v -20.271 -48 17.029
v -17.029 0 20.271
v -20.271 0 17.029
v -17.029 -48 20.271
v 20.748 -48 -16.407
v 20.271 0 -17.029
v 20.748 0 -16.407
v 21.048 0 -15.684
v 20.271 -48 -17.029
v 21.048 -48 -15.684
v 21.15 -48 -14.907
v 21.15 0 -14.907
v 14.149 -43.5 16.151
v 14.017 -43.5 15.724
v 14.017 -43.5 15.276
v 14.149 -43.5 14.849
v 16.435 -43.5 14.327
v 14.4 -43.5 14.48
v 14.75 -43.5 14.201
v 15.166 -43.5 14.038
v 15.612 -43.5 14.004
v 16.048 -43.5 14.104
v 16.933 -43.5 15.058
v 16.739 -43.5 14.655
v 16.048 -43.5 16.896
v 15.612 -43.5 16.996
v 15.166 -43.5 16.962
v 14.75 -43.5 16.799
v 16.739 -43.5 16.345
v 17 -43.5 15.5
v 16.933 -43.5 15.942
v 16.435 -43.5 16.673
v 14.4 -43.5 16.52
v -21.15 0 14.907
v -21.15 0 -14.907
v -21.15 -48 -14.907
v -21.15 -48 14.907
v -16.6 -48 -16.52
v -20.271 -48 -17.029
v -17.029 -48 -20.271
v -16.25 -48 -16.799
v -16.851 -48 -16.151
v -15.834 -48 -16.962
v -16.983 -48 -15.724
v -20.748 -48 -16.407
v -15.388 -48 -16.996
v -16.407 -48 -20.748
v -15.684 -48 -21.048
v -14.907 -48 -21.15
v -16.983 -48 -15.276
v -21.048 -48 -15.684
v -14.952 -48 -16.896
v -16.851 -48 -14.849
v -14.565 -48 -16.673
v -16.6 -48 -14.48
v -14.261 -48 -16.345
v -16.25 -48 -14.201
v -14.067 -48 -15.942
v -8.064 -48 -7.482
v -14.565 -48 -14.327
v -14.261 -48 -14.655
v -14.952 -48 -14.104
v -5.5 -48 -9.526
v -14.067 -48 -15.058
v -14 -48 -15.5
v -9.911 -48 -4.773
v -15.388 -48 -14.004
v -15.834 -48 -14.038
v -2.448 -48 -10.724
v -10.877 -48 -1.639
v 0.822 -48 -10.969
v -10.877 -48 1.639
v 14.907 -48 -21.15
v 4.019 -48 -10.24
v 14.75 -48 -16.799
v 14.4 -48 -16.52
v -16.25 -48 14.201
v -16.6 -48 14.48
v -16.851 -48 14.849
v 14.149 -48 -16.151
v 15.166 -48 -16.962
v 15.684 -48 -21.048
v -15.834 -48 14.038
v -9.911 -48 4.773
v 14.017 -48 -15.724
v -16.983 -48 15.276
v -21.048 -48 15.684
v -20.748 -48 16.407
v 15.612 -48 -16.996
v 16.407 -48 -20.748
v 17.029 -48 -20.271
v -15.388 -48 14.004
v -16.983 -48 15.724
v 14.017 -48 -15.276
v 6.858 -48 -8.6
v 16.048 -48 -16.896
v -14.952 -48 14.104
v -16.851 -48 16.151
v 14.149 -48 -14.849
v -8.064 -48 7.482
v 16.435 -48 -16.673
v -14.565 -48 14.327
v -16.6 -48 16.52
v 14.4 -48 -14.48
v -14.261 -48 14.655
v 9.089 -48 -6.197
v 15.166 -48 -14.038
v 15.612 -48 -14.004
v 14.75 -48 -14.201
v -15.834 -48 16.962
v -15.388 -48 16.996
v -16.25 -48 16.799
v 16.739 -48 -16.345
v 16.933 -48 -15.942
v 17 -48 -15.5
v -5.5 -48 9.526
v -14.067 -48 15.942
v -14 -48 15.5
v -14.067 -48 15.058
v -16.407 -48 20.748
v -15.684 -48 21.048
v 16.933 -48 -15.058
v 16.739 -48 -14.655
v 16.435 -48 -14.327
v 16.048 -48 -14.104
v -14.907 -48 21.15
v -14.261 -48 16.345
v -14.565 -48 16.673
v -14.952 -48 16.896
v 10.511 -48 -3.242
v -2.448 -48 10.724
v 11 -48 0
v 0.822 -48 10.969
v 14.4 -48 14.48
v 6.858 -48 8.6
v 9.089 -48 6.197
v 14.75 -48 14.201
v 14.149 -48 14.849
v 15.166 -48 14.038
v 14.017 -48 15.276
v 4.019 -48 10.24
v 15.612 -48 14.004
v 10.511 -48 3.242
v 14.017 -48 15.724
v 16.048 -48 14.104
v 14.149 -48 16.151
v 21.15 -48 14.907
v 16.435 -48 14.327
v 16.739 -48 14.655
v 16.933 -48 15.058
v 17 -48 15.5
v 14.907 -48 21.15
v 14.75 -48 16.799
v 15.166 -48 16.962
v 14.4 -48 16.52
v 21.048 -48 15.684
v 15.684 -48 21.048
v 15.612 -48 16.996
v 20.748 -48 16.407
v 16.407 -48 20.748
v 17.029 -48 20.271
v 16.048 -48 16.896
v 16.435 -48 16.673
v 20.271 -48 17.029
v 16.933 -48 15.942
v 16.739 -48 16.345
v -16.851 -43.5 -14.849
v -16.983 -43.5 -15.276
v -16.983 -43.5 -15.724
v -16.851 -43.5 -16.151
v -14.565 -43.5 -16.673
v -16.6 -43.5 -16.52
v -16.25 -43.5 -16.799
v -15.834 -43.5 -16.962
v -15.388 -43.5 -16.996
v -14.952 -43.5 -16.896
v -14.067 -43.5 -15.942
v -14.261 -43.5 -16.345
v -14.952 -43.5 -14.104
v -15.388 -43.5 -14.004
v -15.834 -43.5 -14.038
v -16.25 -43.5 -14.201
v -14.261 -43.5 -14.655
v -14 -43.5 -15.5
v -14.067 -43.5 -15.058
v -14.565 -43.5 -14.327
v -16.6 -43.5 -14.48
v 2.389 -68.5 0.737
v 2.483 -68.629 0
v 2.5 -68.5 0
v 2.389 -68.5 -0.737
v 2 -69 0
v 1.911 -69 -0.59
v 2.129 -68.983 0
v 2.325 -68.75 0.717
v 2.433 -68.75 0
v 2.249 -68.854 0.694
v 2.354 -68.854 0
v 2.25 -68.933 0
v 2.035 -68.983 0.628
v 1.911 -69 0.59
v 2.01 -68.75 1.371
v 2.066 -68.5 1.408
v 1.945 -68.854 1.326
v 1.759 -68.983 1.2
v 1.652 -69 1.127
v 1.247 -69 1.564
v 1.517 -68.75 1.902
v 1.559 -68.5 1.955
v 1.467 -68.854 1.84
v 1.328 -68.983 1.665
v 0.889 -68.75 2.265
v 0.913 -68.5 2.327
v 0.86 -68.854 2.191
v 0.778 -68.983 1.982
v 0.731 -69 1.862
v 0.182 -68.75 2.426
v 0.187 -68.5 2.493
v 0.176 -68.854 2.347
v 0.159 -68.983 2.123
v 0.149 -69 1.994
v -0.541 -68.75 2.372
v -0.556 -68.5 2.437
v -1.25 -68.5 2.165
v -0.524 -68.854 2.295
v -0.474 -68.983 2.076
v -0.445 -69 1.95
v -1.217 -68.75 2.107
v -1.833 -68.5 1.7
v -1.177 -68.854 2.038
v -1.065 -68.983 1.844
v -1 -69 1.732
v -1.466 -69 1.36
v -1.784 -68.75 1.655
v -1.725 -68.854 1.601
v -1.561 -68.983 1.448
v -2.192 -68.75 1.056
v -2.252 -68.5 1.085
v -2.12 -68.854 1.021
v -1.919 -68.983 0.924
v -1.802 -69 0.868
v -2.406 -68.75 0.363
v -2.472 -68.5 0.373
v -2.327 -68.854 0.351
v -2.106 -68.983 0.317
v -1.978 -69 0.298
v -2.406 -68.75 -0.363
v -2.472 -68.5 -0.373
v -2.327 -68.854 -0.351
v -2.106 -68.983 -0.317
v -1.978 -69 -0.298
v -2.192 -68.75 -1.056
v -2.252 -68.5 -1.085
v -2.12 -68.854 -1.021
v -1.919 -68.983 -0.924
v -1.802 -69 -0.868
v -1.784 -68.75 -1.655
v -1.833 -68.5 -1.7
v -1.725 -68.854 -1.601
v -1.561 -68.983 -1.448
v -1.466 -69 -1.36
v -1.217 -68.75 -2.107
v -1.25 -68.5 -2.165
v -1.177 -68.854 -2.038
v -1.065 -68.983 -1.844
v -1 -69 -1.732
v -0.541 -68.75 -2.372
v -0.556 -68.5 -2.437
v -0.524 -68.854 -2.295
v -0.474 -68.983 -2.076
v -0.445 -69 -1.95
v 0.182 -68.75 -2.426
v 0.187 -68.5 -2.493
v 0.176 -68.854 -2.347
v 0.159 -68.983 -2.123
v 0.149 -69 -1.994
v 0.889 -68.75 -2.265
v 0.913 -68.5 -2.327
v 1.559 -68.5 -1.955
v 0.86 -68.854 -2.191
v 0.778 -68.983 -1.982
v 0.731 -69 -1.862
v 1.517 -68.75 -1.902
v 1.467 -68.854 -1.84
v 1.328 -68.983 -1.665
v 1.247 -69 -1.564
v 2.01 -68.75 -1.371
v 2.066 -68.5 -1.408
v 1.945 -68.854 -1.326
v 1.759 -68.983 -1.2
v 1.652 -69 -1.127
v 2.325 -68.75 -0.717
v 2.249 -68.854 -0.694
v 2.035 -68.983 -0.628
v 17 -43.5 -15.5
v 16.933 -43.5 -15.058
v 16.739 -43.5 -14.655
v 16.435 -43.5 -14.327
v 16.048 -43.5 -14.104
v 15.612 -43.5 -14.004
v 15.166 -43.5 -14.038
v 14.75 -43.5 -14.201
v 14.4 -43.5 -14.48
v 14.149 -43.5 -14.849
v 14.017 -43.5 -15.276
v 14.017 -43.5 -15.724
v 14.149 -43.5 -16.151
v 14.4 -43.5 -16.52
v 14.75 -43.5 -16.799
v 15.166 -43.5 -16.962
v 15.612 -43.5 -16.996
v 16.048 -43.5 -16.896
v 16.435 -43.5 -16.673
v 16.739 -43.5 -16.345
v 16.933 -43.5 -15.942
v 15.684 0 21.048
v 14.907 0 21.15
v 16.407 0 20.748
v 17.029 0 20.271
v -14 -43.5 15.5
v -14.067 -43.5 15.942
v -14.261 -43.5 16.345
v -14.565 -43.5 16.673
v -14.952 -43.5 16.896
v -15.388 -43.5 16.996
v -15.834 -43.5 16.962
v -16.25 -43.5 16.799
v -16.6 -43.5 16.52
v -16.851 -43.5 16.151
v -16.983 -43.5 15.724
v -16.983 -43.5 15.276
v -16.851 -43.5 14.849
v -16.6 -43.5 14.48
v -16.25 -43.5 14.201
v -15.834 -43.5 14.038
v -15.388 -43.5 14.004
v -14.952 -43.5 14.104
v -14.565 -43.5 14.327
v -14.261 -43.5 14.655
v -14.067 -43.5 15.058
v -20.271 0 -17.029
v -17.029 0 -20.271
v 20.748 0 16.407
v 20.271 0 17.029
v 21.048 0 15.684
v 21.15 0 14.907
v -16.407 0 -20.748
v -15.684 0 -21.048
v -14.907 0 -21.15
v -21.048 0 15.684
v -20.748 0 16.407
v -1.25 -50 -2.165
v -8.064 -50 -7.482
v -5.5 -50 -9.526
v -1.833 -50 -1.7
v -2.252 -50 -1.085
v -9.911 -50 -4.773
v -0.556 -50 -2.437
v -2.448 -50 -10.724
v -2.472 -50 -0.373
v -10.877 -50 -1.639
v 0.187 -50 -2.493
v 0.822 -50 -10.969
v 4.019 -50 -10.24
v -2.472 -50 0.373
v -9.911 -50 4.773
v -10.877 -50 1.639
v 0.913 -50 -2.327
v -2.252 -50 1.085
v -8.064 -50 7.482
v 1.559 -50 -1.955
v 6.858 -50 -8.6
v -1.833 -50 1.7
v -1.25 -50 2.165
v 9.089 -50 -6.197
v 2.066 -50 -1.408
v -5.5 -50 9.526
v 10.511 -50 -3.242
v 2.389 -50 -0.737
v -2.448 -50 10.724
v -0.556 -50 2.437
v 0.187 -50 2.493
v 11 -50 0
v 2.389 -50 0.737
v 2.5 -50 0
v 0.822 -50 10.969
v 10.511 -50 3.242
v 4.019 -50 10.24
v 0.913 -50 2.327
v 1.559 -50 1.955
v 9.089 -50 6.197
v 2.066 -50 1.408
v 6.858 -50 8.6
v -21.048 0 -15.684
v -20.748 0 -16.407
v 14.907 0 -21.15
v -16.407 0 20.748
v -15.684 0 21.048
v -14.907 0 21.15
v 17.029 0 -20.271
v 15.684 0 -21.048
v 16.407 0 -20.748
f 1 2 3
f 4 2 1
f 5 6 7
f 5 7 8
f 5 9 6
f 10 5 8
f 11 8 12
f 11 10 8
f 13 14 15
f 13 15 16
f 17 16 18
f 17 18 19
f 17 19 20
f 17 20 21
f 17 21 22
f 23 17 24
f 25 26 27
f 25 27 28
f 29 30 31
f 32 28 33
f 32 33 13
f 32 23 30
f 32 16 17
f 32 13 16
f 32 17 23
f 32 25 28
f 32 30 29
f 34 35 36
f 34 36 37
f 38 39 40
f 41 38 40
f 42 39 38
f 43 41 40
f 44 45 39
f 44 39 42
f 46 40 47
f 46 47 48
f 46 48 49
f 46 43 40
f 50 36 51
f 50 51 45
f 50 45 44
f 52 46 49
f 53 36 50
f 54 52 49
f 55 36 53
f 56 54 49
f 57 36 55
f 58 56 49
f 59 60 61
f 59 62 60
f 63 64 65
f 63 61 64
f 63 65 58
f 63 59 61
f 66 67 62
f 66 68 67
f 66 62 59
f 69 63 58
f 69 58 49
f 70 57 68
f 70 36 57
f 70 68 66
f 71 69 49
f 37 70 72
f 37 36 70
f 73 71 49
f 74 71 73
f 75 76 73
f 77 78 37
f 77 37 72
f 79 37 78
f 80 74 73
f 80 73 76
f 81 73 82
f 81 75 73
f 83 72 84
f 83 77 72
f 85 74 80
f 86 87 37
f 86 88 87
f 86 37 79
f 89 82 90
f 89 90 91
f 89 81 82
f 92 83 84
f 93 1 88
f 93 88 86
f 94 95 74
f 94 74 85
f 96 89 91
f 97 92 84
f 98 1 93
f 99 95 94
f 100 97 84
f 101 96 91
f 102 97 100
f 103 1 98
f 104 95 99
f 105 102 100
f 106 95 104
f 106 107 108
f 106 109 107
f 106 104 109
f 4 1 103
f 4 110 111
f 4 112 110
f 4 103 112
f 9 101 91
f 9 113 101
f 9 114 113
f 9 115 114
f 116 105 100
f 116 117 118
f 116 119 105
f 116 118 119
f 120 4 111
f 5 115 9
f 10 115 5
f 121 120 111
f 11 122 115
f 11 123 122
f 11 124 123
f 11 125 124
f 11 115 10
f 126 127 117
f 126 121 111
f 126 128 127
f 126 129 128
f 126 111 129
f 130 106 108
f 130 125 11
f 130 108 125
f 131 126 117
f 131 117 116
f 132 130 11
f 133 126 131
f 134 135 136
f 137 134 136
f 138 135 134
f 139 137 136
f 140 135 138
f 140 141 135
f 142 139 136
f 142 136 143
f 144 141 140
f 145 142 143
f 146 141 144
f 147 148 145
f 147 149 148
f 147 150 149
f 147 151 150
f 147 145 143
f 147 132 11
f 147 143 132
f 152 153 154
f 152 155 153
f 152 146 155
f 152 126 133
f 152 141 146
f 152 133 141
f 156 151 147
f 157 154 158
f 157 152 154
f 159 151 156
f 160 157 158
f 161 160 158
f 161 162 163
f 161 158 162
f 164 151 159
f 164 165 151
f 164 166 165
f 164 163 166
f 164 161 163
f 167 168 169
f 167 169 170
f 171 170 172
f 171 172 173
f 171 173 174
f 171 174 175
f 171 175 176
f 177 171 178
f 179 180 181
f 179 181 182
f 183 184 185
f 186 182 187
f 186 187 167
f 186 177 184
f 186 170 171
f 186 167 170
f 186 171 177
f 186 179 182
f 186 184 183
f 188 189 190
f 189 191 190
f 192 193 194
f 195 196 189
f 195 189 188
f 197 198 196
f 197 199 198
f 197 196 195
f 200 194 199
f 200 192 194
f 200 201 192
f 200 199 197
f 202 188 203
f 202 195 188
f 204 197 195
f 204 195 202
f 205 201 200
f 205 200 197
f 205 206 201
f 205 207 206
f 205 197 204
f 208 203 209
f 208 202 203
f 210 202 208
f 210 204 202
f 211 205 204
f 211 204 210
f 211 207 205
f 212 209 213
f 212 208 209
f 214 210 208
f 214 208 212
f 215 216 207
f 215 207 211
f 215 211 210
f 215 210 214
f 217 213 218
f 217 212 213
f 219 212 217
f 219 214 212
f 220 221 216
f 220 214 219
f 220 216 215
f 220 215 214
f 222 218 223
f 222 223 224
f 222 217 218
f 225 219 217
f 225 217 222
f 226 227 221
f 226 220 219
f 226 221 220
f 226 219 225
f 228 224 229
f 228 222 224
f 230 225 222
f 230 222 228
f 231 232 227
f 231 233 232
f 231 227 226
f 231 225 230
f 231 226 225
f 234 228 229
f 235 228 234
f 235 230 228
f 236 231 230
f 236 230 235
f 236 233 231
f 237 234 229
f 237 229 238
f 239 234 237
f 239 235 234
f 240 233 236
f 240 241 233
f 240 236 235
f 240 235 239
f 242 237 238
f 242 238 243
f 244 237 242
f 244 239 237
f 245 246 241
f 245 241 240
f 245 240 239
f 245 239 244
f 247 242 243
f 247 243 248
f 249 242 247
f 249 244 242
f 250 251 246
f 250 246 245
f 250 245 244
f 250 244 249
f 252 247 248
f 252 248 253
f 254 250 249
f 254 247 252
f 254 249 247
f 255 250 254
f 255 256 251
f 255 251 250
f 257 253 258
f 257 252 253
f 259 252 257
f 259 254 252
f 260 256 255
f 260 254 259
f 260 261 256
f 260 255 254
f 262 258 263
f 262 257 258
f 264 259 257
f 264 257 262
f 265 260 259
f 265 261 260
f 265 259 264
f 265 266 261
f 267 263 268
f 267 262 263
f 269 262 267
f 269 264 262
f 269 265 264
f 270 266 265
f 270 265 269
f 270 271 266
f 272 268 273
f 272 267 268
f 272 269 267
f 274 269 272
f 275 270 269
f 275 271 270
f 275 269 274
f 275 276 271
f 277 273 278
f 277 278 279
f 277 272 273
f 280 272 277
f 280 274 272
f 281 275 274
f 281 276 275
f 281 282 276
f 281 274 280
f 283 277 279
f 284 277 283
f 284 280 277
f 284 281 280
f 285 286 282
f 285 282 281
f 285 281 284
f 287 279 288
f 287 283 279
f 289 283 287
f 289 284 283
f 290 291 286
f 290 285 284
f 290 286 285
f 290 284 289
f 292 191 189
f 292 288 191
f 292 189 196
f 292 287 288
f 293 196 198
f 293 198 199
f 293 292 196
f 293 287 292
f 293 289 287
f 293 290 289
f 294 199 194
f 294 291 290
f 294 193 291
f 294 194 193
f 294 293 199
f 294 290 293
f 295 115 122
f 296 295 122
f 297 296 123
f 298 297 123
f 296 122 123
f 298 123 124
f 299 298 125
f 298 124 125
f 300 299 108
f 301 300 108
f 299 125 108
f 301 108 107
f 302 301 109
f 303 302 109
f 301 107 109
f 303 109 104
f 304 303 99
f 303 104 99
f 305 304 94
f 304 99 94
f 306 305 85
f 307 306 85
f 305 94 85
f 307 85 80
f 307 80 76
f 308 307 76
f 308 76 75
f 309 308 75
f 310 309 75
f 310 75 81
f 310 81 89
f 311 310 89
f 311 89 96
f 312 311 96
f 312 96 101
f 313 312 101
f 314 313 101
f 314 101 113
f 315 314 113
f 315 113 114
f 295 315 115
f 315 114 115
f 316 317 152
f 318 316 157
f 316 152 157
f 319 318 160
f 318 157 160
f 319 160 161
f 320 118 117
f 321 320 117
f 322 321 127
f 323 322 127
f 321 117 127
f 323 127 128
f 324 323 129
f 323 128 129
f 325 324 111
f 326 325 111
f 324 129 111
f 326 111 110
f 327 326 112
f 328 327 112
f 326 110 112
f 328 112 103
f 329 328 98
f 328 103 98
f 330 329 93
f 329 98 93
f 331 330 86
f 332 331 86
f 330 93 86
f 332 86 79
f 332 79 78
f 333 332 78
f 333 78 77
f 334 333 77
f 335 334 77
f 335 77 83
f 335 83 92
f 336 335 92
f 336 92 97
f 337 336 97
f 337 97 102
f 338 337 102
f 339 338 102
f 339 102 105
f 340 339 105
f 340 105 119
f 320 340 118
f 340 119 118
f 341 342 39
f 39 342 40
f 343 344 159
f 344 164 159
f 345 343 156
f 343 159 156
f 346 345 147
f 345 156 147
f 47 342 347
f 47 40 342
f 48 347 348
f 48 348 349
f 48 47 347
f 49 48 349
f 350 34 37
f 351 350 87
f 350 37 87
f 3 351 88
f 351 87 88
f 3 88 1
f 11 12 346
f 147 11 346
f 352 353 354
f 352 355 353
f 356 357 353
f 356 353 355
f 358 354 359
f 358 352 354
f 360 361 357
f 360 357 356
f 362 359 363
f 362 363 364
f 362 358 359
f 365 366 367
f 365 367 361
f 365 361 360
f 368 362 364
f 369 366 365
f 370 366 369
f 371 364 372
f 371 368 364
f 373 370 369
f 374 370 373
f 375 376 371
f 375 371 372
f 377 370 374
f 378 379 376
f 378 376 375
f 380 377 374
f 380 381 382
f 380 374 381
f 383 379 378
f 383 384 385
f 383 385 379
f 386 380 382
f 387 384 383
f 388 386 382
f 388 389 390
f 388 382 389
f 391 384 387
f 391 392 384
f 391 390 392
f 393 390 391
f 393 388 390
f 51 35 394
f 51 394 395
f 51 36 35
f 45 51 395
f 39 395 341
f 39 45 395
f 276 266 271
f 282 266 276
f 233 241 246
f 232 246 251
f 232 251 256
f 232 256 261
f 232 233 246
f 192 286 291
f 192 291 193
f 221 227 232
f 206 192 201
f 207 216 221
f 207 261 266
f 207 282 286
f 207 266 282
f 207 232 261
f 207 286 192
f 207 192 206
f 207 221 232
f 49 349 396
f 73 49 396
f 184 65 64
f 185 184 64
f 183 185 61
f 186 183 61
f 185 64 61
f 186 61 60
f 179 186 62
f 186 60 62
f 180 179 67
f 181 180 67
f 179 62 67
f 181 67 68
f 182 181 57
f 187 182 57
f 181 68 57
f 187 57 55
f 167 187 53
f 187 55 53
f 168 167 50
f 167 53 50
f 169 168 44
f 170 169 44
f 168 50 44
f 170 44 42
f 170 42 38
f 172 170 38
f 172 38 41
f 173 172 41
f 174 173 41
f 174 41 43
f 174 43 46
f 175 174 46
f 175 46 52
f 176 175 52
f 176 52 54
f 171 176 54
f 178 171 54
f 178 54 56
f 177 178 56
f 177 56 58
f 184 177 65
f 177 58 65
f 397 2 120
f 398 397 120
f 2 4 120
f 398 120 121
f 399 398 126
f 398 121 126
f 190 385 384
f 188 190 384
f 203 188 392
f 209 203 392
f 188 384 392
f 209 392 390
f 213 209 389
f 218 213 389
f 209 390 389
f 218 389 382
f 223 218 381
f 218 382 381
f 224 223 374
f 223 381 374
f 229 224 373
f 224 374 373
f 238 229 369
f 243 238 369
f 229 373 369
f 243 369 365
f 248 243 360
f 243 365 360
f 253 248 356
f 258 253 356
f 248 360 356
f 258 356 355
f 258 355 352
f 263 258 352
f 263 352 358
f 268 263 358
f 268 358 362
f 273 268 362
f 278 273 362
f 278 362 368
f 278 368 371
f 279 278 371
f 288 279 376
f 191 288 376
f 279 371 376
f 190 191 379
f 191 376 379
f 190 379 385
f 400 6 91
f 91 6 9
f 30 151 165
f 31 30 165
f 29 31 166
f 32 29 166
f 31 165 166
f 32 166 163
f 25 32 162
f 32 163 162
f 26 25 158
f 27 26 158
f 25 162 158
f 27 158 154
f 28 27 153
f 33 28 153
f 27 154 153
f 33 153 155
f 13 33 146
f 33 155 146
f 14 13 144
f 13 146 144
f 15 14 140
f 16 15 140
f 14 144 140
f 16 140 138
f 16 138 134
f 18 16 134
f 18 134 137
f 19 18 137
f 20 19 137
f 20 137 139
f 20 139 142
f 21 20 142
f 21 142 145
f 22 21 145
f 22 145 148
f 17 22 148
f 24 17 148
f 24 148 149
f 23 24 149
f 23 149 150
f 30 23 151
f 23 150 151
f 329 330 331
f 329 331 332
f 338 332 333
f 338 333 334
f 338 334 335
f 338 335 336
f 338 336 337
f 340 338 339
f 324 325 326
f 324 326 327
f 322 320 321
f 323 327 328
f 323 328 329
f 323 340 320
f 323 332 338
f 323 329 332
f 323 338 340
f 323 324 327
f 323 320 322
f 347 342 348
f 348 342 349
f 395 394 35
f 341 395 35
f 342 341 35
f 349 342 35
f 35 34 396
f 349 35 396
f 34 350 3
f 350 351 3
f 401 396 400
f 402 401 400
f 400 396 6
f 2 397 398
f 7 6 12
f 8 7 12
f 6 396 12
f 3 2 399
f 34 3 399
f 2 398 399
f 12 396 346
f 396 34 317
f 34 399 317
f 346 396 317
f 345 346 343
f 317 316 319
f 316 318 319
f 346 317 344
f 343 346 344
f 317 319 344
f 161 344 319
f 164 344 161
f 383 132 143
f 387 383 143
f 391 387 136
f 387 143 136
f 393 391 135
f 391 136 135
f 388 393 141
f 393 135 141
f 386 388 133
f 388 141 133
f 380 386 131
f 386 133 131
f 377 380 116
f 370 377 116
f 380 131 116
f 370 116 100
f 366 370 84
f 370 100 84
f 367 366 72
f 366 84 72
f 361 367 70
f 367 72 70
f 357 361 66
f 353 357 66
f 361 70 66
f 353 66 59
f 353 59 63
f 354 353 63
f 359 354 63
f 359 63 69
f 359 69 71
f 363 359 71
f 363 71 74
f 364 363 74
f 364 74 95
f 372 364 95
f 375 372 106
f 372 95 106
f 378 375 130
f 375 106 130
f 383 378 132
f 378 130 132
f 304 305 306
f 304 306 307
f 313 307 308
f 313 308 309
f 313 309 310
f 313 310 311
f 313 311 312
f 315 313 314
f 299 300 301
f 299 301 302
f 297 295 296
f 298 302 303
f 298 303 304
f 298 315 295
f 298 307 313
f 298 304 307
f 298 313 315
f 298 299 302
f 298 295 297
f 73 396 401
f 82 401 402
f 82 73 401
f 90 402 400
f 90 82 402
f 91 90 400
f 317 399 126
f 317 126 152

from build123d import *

# Parameters (mm, degrees)
F0_W     = 42.3
F0_H     = 42.3
F1_DEPTH = 48
F2_R     = 1.5
F3_DEPTH = 4.5
F4_R     = 11
F5_DEPTH = 2
F6_SIZE  = 5
F7_R     = 2.5
F8_DEPTH = 19
F9_R     = 0.5
F10_R    = 3


with BuildPart() as f1:
    # F0 (on Front) → F1 (new body)
    with BuildSketch(Plane.XZ):
        Rectangle(F0_W, F0_H)
    extrude(amount=F1_DEPTH)

    # F2 (on face) → F3 (cut)
    with BuildSketch(Plane.XZ.offset(48)):
        with Locations((-15.5, 15.5)):
            Circle(F2_R)
        with Locations((-15.5, -15.5)):
            Circle(F2_R)
        with Locations((15.5, -15.5)):
            Circle(F2_R)
        with Locations((15.5, 15.5)):
            Circle(F2_R)
    extrude(amount=-F3_DEPTH, mode=Mode.SUBTRACT)

    # F4 (on face) → F5 (join)
    with BuildSketch(Plane.XZ.offset(48)):
        Circle(F4_R)
    extrude(amount=F5_DEPTH)

    # F6
    f6_edges = [f1.edges().sort_by_distance(p)[0] for p in [
        (21.15, -24, 21.15),
        (-21.15, -24, 21.15),
        (-21.15, -24, -21.15),
        (21.15, -24, -21.15),
    ]]
    chamfer(f6_edges, length=F6_SIZE)

    # F7 (on face) → F8 (join)
    with BuildSketch(Plane.XZ.offset(50)):
        Circle(F7_R)
    extrude(amount=F8_DEPTH)

    # F9
    f9_edges = [f1.edges().sort_by_distance(p)[0] for p in [
        (-2.5, -69, 0),
    ]]
    fillet(f9_edges, radius=F9_R)

    # F10
    f10_edges = [f1.edges().sort_by_distance(p)[0] for p in [
        (16.15, -24, -21.15),
        (21.15, -24, -16.15),
        (-16.15, -24, -21.15),
        (-21.15, -24, -16.15),
        (21.15, -24, 16.15),
        (16.15, -24, 21.15),
        (-16.15, -24, 21.15),
        (-21.15, -24, 16.15),
    ]]
    fillet(f10_edges, radius=F10_R)


solid = f1.part
